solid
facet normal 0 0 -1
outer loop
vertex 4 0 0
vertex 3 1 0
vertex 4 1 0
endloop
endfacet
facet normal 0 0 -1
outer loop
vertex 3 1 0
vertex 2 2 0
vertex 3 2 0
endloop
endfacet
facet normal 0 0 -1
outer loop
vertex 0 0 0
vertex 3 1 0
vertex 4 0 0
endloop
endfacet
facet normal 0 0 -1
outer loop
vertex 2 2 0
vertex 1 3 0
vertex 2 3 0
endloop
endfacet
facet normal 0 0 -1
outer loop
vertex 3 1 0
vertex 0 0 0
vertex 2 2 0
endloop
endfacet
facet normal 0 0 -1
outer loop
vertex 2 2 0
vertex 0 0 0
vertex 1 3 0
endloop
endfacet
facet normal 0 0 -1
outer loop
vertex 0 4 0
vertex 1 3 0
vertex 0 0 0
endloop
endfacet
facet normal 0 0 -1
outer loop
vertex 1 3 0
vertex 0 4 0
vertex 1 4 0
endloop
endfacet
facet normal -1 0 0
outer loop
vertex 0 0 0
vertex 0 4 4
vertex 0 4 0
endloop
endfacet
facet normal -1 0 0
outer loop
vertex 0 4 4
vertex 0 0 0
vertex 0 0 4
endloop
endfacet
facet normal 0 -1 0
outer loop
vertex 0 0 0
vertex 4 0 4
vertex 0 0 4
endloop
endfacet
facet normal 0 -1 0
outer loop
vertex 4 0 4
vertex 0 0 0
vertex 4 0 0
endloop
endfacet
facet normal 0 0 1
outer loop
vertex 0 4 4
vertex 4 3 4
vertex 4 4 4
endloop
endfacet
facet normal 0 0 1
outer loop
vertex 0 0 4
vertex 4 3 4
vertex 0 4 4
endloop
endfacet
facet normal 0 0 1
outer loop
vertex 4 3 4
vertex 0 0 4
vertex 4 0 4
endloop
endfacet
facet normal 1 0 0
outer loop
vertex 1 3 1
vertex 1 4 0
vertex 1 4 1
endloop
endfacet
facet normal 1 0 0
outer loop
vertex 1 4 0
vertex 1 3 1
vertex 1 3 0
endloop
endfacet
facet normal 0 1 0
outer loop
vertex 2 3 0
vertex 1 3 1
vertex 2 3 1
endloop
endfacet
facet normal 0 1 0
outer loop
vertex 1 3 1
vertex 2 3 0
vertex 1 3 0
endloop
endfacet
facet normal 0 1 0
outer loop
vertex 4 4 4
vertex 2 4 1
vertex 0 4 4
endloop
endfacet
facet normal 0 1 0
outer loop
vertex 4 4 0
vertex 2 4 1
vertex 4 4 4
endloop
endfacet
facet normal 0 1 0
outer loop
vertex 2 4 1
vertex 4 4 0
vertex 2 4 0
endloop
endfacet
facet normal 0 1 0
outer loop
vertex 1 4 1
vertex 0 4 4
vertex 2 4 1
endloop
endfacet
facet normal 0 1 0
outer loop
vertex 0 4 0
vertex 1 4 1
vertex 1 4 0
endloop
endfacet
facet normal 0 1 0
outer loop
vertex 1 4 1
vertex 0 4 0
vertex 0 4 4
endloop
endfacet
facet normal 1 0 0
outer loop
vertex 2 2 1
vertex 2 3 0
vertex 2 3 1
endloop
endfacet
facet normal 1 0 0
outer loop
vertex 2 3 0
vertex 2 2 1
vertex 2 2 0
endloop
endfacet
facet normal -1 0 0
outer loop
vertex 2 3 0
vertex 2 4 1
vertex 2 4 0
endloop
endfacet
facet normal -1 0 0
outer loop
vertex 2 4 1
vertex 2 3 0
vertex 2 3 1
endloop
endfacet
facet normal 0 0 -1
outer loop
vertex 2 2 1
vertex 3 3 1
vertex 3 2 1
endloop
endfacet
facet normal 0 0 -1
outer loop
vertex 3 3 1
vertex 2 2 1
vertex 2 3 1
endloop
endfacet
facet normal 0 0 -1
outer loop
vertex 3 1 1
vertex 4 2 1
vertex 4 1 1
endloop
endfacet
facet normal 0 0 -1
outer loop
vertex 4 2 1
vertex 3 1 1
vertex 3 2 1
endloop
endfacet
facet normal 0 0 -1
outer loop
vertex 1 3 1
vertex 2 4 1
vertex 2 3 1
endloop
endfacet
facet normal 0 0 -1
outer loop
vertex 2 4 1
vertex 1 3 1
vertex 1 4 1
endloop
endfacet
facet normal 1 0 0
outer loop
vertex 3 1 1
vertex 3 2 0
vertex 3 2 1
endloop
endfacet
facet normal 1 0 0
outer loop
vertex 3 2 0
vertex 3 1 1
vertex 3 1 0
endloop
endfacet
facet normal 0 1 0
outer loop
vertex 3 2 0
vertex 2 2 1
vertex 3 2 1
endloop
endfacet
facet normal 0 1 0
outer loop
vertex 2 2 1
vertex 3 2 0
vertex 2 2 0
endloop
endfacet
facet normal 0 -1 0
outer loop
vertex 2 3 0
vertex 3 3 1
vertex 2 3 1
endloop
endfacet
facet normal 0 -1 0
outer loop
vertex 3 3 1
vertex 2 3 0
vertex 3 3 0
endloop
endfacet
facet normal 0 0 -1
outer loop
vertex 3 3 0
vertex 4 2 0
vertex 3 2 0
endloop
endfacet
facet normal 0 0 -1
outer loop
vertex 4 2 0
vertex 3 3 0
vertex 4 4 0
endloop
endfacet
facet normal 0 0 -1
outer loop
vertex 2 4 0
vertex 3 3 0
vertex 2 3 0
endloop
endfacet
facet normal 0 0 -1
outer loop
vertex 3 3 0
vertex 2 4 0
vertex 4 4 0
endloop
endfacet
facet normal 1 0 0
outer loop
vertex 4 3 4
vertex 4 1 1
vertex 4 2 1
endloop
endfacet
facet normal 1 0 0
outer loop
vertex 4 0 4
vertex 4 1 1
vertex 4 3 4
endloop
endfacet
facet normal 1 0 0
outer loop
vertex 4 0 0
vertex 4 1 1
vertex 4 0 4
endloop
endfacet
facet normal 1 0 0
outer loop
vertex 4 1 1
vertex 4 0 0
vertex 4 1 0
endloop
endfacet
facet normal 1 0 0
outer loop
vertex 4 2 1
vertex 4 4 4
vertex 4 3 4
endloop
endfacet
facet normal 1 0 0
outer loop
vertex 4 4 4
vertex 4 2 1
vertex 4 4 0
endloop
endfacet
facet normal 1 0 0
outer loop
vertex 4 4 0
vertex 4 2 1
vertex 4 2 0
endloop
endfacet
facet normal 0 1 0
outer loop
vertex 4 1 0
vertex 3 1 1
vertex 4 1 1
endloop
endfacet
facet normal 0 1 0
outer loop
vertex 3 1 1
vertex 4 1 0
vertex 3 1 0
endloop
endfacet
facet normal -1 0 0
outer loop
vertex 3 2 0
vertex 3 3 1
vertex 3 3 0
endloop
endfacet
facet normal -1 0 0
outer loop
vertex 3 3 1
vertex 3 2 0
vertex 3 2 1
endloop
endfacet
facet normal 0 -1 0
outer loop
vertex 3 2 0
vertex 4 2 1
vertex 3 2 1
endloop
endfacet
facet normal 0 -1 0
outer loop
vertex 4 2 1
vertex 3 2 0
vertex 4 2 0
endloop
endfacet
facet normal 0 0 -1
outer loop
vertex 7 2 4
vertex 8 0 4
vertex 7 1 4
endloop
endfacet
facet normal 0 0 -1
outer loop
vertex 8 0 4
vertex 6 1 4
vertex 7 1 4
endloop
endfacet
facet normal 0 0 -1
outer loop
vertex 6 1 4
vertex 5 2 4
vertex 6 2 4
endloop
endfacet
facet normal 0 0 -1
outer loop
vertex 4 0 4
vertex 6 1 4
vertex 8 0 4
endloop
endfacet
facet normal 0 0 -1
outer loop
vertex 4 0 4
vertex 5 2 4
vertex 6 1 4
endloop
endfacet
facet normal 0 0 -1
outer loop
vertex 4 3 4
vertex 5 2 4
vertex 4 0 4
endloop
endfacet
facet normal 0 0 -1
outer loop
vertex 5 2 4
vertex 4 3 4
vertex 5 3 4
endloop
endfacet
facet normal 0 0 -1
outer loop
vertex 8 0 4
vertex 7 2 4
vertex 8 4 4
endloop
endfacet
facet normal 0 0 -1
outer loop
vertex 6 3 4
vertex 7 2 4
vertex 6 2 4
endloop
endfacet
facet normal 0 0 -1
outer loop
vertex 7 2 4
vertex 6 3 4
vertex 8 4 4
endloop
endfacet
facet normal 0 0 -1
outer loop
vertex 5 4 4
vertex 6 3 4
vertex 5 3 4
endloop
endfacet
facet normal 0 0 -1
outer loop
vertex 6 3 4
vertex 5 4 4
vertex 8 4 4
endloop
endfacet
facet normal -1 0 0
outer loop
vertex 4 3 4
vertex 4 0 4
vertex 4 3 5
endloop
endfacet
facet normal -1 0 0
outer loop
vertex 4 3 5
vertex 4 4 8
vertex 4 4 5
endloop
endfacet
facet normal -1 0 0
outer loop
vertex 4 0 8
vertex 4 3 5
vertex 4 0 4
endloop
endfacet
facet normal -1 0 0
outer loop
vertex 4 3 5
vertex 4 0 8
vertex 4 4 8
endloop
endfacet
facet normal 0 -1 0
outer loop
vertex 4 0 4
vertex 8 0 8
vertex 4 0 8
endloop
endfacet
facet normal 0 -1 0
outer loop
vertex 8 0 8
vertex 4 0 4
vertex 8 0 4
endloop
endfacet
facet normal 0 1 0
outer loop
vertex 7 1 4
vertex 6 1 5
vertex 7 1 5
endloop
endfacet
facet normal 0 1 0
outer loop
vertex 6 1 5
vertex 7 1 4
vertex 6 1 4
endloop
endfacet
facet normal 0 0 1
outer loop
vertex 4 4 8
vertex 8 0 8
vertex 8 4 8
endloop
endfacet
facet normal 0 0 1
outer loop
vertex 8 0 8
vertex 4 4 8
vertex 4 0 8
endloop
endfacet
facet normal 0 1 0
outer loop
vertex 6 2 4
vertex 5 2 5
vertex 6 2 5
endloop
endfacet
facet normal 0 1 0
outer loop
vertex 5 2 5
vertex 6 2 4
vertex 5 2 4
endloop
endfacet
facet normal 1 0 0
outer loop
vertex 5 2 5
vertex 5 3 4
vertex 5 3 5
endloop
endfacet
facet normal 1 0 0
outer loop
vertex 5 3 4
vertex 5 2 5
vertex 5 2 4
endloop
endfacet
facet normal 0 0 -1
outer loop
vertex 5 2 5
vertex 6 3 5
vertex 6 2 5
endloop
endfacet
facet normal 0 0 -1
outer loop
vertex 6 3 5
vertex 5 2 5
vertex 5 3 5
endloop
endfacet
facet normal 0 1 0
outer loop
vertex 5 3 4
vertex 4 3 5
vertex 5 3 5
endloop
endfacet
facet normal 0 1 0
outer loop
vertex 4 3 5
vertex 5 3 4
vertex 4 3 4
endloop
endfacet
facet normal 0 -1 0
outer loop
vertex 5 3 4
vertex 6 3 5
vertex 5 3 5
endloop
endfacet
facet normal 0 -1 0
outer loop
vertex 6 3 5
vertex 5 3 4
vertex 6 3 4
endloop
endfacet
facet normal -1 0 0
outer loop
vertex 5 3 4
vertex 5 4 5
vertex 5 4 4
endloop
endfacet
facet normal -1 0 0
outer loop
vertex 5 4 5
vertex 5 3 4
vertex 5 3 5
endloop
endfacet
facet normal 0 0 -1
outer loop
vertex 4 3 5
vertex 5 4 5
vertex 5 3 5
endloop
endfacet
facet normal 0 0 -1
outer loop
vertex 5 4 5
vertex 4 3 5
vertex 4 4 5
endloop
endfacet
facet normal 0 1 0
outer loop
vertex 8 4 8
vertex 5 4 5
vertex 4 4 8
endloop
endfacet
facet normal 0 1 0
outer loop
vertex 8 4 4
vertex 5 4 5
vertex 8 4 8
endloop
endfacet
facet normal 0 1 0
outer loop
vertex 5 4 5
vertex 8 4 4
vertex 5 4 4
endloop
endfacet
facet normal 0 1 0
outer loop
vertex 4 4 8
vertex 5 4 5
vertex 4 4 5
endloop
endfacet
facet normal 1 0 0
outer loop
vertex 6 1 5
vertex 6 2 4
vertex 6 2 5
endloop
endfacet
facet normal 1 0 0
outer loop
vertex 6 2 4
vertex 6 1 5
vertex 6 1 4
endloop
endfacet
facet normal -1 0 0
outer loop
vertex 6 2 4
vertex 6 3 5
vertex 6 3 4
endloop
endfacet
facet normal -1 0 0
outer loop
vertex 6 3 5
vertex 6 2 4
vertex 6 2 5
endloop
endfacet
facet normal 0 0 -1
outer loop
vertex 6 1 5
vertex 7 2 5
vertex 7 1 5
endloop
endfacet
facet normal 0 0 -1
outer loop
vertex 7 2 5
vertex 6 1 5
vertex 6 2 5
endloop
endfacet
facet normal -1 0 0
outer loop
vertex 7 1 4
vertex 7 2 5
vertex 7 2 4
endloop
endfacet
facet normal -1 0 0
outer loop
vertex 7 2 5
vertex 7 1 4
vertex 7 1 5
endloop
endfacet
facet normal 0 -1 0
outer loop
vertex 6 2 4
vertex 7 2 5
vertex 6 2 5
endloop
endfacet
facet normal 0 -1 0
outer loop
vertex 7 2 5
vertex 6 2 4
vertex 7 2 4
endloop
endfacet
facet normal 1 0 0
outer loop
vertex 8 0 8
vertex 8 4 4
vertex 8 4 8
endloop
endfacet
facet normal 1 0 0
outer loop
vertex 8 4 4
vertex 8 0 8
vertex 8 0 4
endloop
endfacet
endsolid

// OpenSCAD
union() {
    translate([0, 0, 0]) cube([1, 1, 1]);
    translate([0, 0, 1]) cube([1, 1, 1]);
    translate([0, 0, 2]) cube([1, 1, 1]);
    translate([0, 0, 3]) cube([1, 1, 1]);
    translate([0, 1, 0]) cube([1, 1, 1]);
    translate([0, 1, 1]) cube([1, 1, 1]);
    translate([0, 1, 2]) cube([1, 1, 1]);
    translate([0, 1, 3]) cube([1, 1, 1]);
    translate([0, 2, 0]) cube([1, 1, 1]);
    translate([0, 2, 1]) cube([1, 1, 1]);
    translate([0, 2, 2]) cube([1, 1, 1]);
    translate([0, 2, 3]) cube([1, 1, 1]);
    translate([0, 3, 0]) cube([1, 1, 1]);
    translate([0, 3, 1]) cube([1, 1, 1]);
    translate([0, 3, 2]) cube([1, 1, 1]);
    translate([0, 3, 3]) cube([1, 1, 1]);
    translate([1, 0, 0]) cube([1, 1, 1]);
    translate([1, 0, 1]) cube([1, 1, 1]);
    translate([1, 0, 2]) cube([1, 1, 1]);
    translate([1, 0, 3]) cube([1, 1, 1]);
    translate([1, 1, 0]) cube([1, 1, 1]);
    translate([1, 1, 1]) cube([1, 1, 1]);
    translate([1, 1, 2]) cube([1, 1, 1]);
    translate([1, 1, 3]) cube([1, 1, 1]);
    translate([1, 2, 0]) cube([1, 1, 1]);
    translate([1, 2, 1]) cube([1, 1, 1]);
    translate([1, 2, 2]) cube([1, 1, 1]);
    translate([1, 2, 3]) cube([1, 1, 1]);
    translate([1, 3, 1]) cube([1, 1, 1]);
    translate([1, 3, 2]) cube([1, 1, 1]);
    translate([1, 3, 3]) cube([1, 1, 1]);
    translate([2, 0, 0]) cube([1, 1, 1]);
    translate([2, 0, 1]) cube([1, 1, 1]);
    translate([2, 0, 2]) cube([1, 1, 1]);
    translate([2, 0, 3]) cube([1, 1, 1]);
    translate([2, 1, 0]) cube([1, 1, 1]);
    translate([2, 1, 1]) cube([1, 1, 1]);
    translate([2, 1, 2]) cube([1, 1, 1]);
    translate([2, 1, 3]) cube([1, 1, 1]);
    translate([2, 2, 1]) cube([1, 1, 1]);
    translate([2, 2, 2]) cube([1, 1, 1]);
    translate([2, 2, 3]) cube([1, 1, 1]);
    translate([2, 3, 0]) cube([1, 1, 1]);
    translate([2, 3, 1]) cube([1, 1, 1]);
    translate([2, 3, 2]) cube([1, 1, 1]);
    translate([2, 3, 3]) cube([1, 1, 1]);
    translate([3, 0, 0]) cube([1, 1, 1]);
    translate([3, 0, 1]) cube([1, 1, 1]);
    translate([3, 0, 2]) cube([1, 1, 1]);
    translate([3, 0, 3]) cube([1, 1, 1]);
    translate([3, 1, 1]) cube([1, 1, 1]);
    translate([3, 1, 2]) cube([1, 1, 1]);
    translate([3, 1, 3]) cube([1, 1, 1]);
    translate([3, 2, 0]) cube([1, 1, 1]);
    translate([3, 2, 1]) cube([1, 1, 1]);
    translate([3, 2, 2]) cube([1, 1, 1]);
    translate([3, 2, 3]) cube([1, 1, 1]);
    translate([3, 3, 0]) cube([1, 1, 1]);
    translate([3, 3, 1]) cube([1, 1, 1]);
    translate([3, 3, 2]) cube([1, 1, 1]);
    translate([3, 3, 3]) cube([1, 1, 1]);
    translate([4, 0, 4]) cube([1, 1, 1]);
    translate([4, 0, 5]) cube([1, 1, 1]);
    translate([4, 0, 6]) cube([1, 1, 1]);
    translate([4, 0, 7]) cube([1, 1, 1]);
    translate([4, 1, 4]) cube([1, 1, 1]);
    translate([4, 1, 5]) cube([1, 1, 1]);
    translate([4, 1, 6]) cube([1, 1, 1]);
    translate([4, 1, 7]) cube([1, 1, 1]);
    translate([4, 2, 4]) cube([1, 1, 1]);
    translate([4, 2, 5]) cube([1, 1, 1]);
    translate([4, 2, 6]) cube([1, 1, 1]);
    translate([4, 2, 7]) cube([1, 1, 1]);
    translate([4, 3, 5]) cube([1, 1, 1]);
    translate([4, 3, 6]) cube([1, 1, 1]);
    translate([4, 3, 7]) cube([1, 1, 1]);
    translate([5, 0, 4]) cube([1, 1, 1]);
    translate([5, 0, 5]) cube([1, 1, 1]);
    translate([5, 0, 6]) cube([1, 1, 1]);
    translate([5, 0, 7]) cube([1, 1, 1]);
    translate([5, 1, 4]) cube([1, 1, 1]);
    translate([5, 1, 5]) cube([1, 1, 1]);
    translate([5, 1, 6]) cube([1, 1, 1]);
    translate([5, 1, 7]) cube([1, 1, 1]);
    translate([5, 2, 5]) cube([1, 1, 1]);
    translate([5, 2, 6]) cube([1, 1, 1]);
    translate([5, 2, 7]) cube([1, 1, 1]);
    translate([5, 3, 4]) cube([1, 1, 1]);
    translate([5, 3, 5]) cube([1, 1, 1]);
    translate([5, 3, 6]) cube([1, 1, 1]);
    translate([5, 3, 7]) cube([1, 1, 1]);
    translate([6, 0, 4]) cube([1, 1, 1]);
    translate([6, 0, 5]) cube([1, 1, 1]);
    translate([6, 0, 6]) cube([1, 1, 1]);
    translate([6, 0, 7]) cube([1, 1, 1]);
    translate([6, 1, 5]) cube([1, 1, 1]);
    translate([6, 1, 6]) cube([1, 1, 1]);
    translate([6, 1, 7]) cube([1, 1, 1]);
    translate([6, 2, 4]) cube([1, 1, 1]);
    translate([6, 2, 5]) cube([1, 1, 1]);
    translate([6, 2, 6]) cube([1, 1, 1]);
    translate([6, 2, 7]) cube([1, 1, 1]);
    translate([6, 3, 4]) cube([1, 1, 1]);
    translate([6, 3, 5]) cube([1, 1, 1]);
    translate([6, 3, 6]) cube([1, 1, 1]);
    translate([6, 3, 7]) cube([1, 1, 1]);
    translate([7, 0, 4]) cube([1, 1, 1]);
    translate([7, 0, 5]) cube([1, 1, 1]);
    translate([7, 0, 6]) cube([1, 1, 1]);
    translate([7, 0, 7]) cube([1, 1, 1]);
    translate([7, 1, 4]) cube([1, 1, 1]);
    translate([7, 1, 5]) cube([1, 1, 1]);
    translate([7, 1, 6]) cube([1, 1, 1]);
    translate([7, 1, 7]) cube([1, 1, 1]);
    translate([7, 2, 4]) cube([1, 1, 1]);
    translate([7, 2, 5]) cube([1, 1, 1]);
    translate([7, 2, 6]) cube([1, 1, 1]);
    translate([7, 2, 7]) cube([1, 1, 1]);
    translate([7, 3, 4]) cube([1, 1, 1]);
    translate([7, 3, 5]) cube([1, 1, 1]);
    translate([7, 3, 6]) cube([1, 1, 1]);
    translate([7, 3, 7]) cube([1, 1, 1]);
}
